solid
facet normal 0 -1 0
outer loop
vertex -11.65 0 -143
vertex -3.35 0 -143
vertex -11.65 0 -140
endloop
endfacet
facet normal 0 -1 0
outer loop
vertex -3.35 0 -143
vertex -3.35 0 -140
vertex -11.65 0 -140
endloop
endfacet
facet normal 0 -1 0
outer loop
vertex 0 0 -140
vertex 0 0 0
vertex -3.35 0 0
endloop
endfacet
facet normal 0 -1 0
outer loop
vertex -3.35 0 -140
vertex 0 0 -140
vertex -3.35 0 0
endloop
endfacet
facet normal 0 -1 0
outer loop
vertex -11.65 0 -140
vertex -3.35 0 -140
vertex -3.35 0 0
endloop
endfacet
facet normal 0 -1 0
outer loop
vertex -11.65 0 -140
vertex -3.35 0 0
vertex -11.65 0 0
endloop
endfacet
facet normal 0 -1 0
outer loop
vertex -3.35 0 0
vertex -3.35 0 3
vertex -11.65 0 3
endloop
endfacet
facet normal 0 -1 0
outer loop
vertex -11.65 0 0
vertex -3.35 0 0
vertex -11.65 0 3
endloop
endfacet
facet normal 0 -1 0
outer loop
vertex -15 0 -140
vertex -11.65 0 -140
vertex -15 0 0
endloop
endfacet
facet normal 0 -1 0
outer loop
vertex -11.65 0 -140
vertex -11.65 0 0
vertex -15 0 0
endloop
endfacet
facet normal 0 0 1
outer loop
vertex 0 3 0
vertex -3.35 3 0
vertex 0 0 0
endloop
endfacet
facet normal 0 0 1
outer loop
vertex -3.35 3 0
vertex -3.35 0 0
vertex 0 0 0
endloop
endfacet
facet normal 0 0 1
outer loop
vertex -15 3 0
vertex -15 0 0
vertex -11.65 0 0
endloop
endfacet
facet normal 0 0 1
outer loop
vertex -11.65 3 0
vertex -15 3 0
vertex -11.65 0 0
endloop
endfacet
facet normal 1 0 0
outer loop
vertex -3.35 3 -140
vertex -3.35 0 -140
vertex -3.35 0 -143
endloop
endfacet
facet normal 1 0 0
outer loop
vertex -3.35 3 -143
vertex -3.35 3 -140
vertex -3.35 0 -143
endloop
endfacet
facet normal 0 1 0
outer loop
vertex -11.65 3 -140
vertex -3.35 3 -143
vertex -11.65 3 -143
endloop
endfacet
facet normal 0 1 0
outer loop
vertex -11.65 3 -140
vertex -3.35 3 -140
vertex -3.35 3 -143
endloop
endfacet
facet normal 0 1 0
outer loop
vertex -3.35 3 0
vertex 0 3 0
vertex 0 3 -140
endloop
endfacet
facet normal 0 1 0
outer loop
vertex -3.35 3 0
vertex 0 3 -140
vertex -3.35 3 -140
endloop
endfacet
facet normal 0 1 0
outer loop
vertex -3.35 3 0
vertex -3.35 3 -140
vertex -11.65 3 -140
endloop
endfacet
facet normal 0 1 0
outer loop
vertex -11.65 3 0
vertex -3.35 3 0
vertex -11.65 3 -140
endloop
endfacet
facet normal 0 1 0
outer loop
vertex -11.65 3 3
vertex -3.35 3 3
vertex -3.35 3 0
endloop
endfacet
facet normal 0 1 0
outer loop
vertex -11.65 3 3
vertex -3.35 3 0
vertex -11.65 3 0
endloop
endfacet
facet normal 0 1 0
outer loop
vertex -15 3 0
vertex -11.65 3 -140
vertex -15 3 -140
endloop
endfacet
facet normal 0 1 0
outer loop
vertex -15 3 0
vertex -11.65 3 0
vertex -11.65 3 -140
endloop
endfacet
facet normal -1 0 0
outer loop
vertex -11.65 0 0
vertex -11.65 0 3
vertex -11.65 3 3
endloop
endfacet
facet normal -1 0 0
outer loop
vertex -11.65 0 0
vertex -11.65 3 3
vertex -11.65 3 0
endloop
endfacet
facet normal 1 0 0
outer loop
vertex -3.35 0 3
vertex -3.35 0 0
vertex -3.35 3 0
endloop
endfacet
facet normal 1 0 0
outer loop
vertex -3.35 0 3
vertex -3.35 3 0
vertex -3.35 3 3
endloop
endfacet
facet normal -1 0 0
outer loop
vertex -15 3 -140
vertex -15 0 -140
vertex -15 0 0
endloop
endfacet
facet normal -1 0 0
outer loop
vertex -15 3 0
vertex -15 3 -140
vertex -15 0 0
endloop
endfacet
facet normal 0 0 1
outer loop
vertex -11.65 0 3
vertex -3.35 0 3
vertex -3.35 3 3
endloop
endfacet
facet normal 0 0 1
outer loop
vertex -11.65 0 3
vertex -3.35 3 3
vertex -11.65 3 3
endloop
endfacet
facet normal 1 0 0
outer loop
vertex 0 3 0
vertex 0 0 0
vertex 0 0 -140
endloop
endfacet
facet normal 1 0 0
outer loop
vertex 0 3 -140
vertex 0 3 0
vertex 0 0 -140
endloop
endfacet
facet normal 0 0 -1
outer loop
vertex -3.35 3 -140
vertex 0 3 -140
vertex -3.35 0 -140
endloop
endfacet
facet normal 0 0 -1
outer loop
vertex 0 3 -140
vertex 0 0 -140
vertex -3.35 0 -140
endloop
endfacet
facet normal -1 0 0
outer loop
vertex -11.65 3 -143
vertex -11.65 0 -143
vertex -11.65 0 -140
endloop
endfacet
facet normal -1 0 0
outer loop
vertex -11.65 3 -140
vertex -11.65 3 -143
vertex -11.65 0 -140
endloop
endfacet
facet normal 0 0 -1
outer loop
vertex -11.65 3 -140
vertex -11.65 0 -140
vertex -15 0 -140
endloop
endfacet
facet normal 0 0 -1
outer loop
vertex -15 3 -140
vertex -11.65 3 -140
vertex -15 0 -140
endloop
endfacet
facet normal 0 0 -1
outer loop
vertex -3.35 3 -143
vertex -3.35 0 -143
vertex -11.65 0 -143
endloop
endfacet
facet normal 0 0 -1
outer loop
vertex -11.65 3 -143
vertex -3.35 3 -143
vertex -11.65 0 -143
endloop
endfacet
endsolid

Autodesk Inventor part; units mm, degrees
ref_plane "YZ Plane" through (0, 0, 0) normal (1, 0, 0) x (0, 1, 0)
ref_plane "XZ Plane" through (0, 0, 0) normal (0, 1, 0) x (-1, 0, 0)
ref_plane "XY Plane" through (0, 0, 0) normal (0, 0, 1) x (1, 0, 0)
sketch "草圖1" plane through (0, 0, 0) normal (0, 1, 0) x (-1, 0, 0)
  line L0 (0, 0) -> (0, -140)
  line L1 (15, -140) -> (15, 0)
  line L2 (3.35, 0) -> (3.35, 3)
  line L3 (3.35, 3) -> (11.65, 3)
  line L4 (11.65, 3) -> (11.65, 0)
  line L5 (3.35, -140) -> (3.35, -143)
  line L6 (3.35, -143) -> (11.65, -143)
  line L7 (11.65, -143) -> (11.65, -140)
  line L8 (0, -140) -> (3.35, -140)
  line L9 (11.65, -140) -> (15, -140)
  line L10 (15, 0) -> (11.65, 0)
  line L11 (3.35, 0) -> (0, 0)
  dimension "d0" = 3
  dimension "d1" = 8.3
  dimension "d2" = 15
  dimension "d4" = 3
  dimension "d5" = 8.3
  dimension "d7" = 140
  dimension "d8" = 140
  dimension "d28" = 3.35
  dimension "d29" = 3.35
extrude "擠出1" add sketch "草圖1" along normal blind 3
sketch "草圖3" plane through (0, 0, 0) normal (0, -1, 0) x (1, 0, 0)
  line L0 (5, 3) -> (0, 3)
  line L1 (0, 3) -> (0, -143)
  line L2 (0, -143) -> (5, -143)
  line L3 (5, -143) -> (5, 3)
  line L4 (0, 0) -> (0, -140) projected
  line L5 (-11.65, 3) -> (-3.35, 3) projected
  dimension "d24" = 146
  dimension "d25" = 5
extrude "擠出3" [suppressed]
sketch "草圖2" plane through (0, 3, 0) normal (0, 1, 0) x (1, 0, 0)
  line L0 (0, 140) -> (-3.35, 140) projected
  line L1 (-3.35, 140) -> (-3.35, 143) projected
  line L2 (-3.35, 143) -> (-11.65, 143) projected
  line L3 (-11.65, 143) -> (-11.65, 140) projected
  line L4 (-11.65, 140) -> (-15, 140) projected
  line L5 (-15, 140) -> (-15, 0) projected
  line L6 (-15, 0) -> (-11.65, 0) projected
  line L7 (-11.65, 0) -> (-11.65, -3) projected
  line L8 (-11.65, -3) -> (-3.35, -3) projected
  line L9 (-3.35, -3) -> (-3.35, 0) projected
  line L10 (-3.35, 0) -> (0, 0) projected
  line L11 (-4, 134) -> (1, 134)
  line L12 (1, 134) -> (1, 6)
  line L13 (1, 6) -> (-4, 6)
  line L14 (-4, 6) -> (-4, 134)
  line L15 (-4, 67.5707) -> (-4, 72.4293)
  line L16 (-5, 72.4293) -> (-5, 67.5707)
  line L17 (5, 143) -> (5, -3) projected
  line L18 (0, 0) -> (0, 140) projected
  dimension "d17" = 5
  dimension "d19" = 6
  dimension "d20" = 6
  dimension "d30" = 4
extrude "擠出2" [suppressed]
sketch "草圖4" plane through (0, 3, 0) normal (0, 1, 0) x (1, 0, 0)
  line L0 (0, 0) -> (0, 140) projected
  line L1 (0, 140) -> (-3.35, 140) projected
  line L2 (-3.35, 140) -> (-3.35, 143) projected
  line L3 (-3.35, 143) -> (-11.65, 143) projected
  line L4 (-11.65, 143) -> (-11.65, 140) projected
  line L5 (-11.65, 140) -> (-15, 140) projected
  line L6 (-15, 140) -> (-15, 0) projected
  line L7 (-15, 0) -> (-11.65, 0) projected
  line L8 (-11.65, 0) -> (-11.65, -3) projected
  line L9 (-11.65, -3) -> (-3.35, -3) projected
  line L10 (-3.35, -3) -> (-3.35, 0) projected
  line L11 (-3.35, 0) -> (0, 0) projected
equation "\"d29\" = d28"
properties part number "chassis_1_3"
